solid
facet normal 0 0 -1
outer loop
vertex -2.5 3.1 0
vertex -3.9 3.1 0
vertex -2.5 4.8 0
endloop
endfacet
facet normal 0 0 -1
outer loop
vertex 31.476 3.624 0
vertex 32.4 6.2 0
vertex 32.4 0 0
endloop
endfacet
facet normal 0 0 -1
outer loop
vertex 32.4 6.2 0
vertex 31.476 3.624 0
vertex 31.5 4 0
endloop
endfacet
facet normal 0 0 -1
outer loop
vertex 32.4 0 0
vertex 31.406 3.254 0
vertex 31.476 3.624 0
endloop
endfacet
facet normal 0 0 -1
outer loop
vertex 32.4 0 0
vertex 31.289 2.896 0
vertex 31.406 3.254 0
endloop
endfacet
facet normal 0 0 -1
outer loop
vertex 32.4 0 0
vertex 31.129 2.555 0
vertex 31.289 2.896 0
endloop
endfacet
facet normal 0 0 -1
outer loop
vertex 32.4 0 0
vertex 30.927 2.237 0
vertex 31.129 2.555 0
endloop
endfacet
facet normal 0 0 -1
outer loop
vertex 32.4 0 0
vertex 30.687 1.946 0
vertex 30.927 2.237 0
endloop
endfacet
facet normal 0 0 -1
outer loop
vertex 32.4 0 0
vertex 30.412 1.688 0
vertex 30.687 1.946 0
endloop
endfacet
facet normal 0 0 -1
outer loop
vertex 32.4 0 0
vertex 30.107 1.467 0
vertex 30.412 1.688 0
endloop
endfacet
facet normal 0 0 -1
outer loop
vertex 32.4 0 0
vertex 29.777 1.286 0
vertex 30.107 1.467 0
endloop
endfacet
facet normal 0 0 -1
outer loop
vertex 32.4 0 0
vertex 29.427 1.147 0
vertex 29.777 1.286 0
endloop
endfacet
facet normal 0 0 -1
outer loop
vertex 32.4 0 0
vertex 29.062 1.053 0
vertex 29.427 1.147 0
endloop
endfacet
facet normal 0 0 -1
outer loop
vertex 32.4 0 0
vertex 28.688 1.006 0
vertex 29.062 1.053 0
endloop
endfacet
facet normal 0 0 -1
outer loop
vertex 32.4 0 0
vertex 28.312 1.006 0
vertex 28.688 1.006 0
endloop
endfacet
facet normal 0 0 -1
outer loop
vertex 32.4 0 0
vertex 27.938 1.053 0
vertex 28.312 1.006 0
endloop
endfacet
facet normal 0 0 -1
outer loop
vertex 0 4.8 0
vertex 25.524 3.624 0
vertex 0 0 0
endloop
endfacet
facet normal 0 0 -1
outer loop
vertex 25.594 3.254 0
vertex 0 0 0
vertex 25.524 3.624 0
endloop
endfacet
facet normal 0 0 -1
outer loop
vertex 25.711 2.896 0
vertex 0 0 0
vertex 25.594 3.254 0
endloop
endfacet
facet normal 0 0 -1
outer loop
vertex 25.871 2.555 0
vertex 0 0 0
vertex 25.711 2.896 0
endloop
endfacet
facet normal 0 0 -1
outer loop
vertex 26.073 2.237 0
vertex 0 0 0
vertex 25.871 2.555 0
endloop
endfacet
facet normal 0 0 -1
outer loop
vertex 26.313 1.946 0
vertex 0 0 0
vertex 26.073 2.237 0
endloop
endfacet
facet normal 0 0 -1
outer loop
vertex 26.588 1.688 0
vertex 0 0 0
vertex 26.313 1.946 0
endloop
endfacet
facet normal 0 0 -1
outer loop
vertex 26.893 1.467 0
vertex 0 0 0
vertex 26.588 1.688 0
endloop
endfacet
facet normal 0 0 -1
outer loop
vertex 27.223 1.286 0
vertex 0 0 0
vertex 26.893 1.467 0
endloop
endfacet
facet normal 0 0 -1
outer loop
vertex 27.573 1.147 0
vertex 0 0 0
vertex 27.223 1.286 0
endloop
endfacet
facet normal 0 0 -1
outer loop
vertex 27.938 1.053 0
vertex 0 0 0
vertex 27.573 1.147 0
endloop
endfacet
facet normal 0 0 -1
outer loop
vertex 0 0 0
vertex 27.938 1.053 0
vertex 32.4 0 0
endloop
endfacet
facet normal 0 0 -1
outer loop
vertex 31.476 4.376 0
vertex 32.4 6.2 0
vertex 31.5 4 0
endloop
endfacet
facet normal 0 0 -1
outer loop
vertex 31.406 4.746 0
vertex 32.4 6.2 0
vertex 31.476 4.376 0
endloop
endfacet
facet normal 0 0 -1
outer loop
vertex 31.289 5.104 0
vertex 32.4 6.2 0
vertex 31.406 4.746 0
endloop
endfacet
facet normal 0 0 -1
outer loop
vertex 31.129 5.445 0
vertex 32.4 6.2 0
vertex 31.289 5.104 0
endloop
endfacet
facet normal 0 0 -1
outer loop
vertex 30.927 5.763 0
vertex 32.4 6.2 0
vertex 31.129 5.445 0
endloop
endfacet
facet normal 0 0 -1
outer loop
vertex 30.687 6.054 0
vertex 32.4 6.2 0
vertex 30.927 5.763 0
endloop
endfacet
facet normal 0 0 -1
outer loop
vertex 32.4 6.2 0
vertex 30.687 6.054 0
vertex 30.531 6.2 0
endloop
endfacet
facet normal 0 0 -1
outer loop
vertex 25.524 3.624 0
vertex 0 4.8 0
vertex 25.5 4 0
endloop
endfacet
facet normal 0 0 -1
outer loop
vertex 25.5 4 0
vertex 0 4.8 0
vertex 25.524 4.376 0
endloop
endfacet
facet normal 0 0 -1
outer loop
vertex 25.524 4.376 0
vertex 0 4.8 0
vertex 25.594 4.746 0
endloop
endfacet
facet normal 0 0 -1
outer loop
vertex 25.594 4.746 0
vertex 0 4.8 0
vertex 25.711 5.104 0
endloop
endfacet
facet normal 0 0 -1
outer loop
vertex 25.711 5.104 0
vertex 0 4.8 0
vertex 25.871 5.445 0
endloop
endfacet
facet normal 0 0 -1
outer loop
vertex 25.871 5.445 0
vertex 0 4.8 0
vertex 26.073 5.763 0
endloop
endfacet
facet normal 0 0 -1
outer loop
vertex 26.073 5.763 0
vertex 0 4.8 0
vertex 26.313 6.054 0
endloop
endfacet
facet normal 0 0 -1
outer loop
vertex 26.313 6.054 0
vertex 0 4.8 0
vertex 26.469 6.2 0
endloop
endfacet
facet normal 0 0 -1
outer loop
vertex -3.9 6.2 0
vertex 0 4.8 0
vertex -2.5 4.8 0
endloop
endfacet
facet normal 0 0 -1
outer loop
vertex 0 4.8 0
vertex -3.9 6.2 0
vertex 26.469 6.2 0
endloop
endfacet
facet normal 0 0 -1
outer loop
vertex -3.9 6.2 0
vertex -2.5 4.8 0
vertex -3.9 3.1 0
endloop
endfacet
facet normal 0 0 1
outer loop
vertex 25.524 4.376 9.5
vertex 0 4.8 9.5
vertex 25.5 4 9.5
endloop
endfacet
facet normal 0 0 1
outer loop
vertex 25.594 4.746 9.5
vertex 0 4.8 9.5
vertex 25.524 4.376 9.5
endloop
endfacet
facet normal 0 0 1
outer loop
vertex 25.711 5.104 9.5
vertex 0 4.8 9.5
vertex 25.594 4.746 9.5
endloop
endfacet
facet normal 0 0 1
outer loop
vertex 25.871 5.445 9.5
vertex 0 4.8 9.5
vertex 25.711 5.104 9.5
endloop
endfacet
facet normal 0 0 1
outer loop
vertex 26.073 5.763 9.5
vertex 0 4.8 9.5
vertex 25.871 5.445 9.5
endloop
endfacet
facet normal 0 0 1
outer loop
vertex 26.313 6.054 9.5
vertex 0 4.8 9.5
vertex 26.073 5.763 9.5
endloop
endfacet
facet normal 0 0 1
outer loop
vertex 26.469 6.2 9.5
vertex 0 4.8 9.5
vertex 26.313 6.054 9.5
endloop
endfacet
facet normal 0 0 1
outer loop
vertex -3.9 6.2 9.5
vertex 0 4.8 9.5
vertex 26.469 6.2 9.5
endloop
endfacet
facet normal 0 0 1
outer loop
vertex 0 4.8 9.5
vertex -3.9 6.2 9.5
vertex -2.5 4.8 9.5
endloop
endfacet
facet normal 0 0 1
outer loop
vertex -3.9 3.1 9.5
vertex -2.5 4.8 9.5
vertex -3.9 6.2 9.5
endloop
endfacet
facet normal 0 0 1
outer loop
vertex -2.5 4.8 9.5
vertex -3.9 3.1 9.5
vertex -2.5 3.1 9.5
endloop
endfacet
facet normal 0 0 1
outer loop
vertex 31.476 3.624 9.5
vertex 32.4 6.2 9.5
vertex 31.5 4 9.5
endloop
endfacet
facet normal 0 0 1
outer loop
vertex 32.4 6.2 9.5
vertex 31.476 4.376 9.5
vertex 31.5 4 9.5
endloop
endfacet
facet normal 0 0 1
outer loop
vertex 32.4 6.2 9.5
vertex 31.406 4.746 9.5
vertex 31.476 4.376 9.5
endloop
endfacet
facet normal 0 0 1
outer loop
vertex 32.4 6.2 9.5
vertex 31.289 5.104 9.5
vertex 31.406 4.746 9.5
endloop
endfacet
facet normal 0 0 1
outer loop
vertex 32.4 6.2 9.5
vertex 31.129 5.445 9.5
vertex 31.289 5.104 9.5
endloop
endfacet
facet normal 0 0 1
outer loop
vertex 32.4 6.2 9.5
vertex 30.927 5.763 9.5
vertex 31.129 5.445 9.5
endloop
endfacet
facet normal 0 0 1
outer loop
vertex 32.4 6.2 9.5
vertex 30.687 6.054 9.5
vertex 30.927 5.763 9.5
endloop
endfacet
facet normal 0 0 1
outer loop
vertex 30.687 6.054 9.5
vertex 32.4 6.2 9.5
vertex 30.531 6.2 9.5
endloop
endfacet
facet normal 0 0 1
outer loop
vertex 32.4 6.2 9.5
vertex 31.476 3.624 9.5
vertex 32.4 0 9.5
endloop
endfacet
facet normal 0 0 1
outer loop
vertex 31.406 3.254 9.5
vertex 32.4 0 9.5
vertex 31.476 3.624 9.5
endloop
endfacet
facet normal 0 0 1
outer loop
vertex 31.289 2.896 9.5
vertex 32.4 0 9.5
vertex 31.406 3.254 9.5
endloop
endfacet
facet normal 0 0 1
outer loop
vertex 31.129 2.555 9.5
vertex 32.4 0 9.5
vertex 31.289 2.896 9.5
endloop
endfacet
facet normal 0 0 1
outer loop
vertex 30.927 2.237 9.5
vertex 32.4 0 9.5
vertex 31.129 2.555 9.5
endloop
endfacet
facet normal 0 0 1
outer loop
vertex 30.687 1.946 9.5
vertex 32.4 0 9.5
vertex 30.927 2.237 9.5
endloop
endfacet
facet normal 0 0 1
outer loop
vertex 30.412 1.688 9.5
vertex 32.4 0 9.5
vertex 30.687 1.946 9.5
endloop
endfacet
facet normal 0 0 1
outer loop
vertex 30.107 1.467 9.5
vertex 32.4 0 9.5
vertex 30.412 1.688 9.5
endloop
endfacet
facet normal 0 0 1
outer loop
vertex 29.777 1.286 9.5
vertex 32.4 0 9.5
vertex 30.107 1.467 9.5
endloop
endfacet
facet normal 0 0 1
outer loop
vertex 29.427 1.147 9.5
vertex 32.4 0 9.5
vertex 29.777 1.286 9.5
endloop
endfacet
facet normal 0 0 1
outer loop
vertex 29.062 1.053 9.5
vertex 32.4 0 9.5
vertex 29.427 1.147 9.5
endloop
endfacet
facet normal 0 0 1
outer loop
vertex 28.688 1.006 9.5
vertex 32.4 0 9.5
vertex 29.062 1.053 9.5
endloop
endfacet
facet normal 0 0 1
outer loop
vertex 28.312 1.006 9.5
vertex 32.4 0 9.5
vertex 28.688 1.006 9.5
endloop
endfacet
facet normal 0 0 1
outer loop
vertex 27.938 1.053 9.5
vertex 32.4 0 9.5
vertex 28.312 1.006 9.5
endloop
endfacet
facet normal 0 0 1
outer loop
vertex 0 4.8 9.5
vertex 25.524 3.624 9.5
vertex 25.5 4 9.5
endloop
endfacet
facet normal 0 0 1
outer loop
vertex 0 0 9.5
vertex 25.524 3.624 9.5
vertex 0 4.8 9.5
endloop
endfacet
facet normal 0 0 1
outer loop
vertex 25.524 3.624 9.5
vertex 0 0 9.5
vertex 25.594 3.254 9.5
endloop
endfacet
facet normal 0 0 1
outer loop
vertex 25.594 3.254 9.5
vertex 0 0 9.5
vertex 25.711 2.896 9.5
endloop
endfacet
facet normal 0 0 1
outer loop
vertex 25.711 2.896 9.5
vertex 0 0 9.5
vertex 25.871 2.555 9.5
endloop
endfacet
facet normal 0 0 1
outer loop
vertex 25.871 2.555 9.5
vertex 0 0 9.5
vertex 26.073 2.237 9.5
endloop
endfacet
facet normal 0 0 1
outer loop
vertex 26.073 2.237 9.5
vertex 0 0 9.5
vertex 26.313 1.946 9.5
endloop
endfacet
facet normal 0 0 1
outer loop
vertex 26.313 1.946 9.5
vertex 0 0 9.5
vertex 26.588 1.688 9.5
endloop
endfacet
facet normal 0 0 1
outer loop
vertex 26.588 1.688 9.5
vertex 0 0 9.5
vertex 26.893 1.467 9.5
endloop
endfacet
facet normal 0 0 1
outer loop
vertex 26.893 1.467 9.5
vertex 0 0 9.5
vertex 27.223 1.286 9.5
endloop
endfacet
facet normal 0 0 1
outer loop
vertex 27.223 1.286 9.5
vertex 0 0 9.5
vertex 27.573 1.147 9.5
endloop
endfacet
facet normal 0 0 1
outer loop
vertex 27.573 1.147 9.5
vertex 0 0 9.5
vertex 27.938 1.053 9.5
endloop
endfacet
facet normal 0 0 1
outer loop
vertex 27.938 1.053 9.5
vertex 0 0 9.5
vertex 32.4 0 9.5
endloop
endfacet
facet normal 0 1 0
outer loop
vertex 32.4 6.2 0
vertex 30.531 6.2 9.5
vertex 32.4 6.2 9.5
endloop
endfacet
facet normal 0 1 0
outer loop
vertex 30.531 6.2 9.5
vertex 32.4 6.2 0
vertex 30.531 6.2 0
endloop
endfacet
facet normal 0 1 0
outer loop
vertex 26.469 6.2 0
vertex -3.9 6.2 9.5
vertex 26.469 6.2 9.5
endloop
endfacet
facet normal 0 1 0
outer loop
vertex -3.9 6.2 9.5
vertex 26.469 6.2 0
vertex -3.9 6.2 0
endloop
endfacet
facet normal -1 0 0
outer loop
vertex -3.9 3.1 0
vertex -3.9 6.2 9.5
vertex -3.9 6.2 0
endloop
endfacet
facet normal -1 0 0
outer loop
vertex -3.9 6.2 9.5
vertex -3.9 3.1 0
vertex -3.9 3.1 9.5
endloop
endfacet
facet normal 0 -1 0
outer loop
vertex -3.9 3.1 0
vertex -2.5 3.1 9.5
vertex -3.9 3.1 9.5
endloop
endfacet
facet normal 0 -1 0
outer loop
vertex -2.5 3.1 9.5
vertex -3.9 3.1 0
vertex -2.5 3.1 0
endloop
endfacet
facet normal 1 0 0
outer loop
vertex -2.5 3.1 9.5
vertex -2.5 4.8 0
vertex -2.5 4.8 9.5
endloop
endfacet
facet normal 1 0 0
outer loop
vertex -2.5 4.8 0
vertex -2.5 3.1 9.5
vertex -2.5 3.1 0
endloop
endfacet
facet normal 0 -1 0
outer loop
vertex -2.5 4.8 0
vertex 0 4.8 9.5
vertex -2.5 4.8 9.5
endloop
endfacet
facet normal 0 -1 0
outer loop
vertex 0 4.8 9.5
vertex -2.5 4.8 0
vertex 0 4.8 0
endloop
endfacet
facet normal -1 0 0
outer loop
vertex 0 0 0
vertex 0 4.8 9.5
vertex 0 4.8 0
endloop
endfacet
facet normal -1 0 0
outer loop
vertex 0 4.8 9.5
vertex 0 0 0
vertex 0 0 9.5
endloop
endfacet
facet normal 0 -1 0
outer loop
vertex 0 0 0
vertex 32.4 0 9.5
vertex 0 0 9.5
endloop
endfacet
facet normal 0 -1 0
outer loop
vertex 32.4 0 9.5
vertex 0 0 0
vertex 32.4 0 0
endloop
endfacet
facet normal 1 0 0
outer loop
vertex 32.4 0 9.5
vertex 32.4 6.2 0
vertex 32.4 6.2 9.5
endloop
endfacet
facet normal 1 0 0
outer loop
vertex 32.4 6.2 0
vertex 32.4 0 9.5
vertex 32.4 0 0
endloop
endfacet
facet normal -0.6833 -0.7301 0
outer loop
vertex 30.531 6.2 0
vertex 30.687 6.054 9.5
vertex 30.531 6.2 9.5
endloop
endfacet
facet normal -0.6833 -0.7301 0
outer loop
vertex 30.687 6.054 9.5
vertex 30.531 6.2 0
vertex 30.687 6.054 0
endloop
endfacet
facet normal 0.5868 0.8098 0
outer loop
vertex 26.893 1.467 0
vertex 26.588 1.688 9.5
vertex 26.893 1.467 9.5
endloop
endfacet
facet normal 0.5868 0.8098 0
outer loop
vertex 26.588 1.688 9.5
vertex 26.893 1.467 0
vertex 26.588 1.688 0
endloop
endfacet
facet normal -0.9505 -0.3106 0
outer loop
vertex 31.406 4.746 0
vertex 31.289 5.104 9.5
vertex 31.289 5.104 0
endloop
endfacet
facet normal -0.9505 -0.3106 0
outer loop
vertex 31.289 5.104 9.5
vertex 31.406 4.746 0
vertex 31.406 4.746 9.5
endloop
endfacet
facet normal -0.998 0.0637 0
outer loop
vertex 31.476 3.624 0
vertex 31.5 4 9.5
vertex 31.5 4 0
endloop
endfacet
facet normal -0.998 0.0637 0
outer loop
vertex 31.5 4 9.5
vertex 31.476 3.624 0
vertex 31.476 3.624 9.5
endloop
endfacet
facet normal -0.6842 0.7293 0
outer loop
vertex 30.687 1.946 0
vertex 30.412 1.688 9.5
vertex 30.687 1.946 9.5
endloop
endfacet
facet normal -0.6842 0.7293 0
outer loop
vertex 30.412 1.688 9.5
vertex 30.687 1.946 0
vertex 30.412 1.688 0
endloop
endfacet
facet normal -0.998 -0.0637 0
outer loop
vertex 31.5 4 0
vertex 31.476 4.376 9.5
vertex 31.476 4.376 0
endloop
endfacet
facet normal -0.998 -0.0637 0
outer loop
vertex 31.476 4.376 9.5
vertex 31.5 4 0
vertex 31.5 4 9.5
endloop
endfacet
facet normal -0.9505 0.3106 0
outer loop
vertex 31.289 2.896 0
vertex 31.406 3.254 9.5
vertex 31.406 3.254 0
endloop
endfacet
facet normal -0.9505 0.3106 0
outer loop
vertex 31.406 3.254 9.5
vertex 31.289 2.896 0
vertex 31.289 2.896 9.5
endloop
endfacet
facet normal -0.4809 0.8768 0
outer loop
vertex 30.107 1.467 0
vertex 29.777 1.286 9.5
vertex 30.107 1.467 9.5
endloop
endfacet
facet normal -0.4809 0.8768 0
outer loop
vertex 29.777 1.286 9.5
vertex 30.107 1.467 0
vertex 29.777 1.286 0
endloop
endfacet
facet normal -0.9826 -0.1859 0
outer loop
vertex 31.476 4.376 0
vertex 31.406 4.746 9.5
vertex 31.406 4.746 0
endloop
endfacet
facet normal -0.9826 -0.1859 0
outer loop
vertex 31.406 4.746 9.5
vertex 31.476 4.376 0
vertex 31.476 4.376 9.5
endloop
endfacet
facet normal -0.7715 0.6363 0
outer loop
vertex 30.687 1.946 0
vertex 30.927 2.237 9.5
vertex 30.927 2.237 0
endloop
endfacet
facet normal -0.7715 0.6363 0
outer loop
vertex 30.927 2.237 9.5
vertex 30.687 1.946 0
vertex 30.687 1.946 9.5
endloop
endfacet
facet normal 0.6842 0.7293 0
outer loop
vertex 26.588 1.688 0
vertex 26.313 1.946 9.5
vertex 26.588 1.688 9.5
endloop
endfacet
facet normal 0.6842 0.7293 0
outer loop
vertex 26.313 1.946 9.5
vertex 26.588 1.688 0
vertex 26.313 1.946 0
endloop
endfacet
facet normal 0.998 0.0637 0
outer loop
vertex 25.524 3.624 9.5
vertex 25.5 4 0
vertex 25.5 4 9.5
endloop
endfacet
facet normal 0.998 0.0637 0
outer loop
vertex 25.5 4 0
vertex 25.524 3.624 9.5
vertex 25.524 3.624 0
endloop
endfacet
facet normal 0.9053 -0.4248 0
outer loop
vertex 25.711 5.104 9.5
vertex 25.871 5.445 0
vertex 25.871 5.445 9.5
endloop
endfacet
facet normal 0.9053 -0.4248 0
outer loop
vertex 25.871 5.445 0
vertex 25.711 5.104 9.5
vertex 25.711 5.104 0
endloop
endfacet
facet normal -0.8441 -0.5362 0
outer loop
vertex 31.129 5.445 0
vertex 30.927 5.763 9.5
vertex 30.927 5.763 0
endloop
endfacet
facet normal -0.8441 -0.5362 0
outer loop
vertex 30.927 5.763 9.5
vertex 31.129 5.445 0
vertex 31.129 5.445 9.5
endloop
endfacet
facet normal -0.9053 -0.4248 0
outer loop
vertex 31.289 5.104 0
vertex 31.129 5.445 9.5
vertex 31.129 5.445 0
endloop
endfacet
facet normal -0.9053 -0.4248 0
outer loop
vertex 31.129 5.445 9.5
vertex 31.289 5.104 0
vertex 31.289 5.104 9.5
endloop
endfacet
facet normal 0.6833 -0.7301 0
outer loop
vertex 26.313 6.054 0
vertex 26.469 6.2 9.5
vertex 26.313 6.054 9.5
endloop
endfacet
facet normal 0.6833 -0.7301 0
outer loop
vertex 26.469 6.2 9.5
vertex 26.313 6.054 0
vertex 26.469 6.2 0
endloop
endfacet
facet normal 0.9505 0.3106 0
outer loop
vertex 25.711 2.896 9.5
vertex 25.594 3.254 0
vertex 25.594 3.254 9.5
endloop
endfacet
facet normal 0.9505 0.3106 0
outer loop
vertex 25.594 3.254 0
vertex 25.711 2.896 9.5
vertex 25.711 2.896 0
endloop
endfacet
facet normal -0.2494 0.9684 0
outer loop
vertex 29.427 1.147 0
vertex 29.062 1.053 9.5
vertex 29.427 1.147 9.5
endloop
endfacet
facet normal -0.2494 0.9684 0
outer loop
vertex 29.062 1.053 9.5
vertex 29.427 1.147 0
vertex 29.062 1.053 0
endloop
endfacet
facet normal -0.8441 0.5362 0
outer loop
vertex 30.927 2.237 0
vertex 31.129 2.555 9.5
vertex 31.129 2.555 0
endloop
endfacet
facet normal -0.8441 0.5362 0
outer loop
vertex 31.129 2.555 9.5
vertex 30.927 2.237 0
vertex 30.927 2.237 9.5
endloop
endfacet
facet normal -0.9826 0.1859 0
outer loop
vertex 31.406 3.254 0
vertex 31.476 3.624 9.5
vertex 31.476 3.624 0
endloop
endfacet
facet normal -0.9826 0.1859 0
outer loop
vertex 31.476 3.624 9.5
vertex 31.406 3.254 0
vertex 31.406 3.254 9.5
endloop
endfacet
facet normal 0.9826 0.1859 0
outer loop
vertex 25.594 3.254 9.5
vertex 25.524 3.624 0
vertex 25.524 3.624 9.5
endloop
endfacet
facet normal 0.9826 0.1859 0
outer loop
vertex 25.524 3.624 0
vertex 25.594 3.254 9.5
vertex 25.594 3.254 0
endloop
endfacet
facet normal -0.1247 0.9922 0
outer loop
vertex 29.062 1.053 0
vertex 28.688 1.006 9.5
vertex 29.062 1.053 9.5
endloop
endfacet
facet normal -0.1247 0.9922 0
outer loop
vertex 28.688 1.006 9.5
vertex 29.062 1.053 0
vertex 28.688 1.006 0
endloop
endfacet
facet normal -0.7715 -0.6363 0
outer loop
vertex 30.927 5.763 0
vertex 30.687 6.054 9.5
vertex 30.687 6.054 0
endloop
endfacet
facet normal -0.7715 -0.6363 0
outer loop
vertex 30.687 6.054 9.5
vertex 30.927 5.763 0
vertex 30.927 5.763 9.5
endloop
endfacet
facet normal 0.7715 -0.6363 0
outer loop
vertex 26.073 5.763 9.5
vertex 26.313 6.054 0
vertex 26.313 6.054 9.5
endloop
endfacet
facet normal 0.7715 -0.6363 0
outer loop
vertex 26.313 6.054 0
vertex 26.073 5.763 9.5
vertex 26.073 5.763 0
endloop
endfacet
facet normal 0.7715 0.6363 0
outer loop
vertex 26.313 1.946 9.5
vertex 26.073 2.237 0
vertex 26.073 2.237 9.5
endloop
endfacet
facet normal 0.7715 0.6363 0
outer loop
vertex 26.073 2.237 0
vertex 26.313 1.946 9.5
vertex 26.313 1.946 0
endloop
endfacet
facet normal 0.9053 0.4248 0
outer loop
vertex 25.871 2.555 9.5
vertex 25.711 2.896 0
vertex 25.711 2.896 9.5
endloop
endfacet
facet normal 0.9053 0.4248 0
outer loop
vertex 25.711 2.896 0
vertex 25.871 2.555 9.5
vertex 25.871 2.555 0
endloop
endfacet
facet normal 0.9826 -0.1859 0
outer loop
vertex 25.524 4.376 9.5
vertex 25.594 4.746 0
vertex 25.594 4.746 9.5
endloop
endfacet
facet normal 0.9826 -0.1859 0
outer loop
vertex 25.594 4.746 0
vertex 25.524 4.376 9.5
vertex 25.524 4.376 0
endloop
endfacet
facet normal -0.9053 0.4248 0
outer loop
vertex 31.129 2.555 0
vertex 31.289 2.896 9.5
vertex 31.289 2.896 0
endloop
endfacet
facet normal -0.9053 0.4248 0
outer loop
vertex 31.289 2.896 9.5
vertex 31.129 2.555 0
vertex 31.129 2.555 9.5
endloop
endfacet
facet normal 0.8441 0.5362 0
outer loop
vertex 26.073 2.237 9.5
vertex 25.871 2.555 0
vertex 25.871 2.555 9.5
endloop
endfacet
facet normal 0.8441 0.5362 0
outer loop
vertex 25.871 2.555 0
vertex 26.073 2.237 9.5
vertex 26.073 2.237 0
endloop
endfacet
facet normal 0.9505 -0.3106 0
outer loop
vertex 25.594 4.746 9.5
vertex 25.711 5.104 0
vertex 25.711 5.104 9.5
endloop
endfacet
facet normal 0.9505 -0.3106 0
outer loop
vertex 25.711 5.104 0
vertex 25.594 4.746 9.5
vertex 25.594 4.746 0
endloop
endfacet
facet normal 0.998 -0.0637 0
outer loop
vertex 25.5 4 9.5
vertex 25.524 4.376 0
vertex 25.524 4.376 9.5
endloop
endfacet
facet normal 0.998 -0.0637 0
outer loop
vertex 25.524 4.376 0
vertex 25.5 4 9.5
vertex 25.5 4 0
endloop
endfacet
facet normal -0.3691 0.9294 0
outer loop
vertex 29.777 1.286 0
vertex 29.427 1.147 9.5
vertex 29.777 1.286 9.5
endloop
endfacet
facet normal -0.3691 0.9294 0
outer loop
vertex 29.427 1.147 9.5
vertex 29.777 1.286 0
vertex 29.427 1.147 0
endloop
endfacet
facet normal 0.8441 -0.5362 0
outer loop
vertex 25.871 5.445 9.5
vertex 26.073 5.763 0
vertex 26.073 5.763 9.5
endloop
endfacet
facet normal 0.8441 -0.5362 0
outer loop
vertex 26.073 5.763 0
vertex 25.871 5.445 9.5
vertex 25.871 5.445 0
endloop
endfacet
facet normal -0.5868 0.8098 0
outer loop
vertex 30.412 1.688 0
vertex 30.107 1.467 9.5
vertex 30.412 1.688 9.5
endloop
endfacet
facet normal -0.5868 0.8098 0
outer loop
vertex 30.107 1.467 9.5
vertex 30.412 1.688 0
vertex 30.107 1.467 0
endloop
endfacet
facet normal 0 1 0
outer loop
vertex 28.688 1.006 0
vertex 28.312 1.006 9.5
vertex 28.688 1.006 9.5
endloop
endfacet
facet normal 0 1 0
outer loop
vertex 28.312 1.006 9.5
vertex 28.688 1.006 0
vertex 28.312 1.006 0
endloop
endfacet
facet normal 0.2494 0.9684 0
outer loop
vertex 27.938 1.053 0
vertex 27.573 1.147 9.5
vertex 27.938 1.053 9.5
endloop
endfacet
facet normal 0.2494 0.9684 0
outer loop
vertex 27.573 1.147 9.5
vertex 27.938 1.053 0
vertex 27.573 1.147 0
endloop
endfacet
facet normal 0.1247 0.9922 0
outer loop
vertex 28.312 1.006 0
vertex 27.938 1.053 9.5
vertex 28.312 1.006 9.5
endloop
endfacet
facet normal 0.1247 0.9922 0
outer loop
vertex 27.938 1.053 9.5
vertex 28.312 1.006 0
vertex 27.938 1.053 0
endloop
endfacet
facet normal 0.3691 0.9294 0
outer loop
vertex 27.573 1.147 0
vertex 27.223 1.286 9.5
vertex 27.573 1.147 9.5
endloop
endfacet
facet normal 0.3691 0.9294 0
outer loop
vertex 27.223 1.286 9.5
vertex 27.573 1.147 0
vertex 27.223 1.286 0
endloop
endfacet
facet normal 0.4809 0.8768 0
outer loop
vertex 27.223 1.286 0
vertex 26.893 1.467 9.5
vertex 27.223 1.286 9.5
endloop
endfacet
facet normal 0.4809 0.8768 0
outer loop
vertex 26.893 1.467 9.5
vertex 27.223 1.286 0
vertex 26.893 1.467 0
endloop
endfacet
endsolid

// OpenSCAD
/*
Title: Candy dishwasher - Door handle front plate
*/
$fn=20;

text = "Center";
font = "Liberation Sans";

module body(){
    polygon(points=[[0,0],[32.4,0],
    [32.4,6.2],[-3.9,6.2],[-3.9,3.1],[-2.5, 3.1],[-2.5, 4.8],[0, 4.8]
     ]);
}

module hole(){
    translate([28.5,4,-1]) 
    cylinder(r=3,h=12,$fn=50);
}

module logo(text){
    text(text,font = font, size = 5); 
}
  

union() {
    difference(){
        linear_extrude (height=9.5)
        body();
        hole();
    };
    /*translate([7,6.2,7])
        rotate([-90])
        linear_extrude (height=1)
       // logo("©JMT");*/
}
